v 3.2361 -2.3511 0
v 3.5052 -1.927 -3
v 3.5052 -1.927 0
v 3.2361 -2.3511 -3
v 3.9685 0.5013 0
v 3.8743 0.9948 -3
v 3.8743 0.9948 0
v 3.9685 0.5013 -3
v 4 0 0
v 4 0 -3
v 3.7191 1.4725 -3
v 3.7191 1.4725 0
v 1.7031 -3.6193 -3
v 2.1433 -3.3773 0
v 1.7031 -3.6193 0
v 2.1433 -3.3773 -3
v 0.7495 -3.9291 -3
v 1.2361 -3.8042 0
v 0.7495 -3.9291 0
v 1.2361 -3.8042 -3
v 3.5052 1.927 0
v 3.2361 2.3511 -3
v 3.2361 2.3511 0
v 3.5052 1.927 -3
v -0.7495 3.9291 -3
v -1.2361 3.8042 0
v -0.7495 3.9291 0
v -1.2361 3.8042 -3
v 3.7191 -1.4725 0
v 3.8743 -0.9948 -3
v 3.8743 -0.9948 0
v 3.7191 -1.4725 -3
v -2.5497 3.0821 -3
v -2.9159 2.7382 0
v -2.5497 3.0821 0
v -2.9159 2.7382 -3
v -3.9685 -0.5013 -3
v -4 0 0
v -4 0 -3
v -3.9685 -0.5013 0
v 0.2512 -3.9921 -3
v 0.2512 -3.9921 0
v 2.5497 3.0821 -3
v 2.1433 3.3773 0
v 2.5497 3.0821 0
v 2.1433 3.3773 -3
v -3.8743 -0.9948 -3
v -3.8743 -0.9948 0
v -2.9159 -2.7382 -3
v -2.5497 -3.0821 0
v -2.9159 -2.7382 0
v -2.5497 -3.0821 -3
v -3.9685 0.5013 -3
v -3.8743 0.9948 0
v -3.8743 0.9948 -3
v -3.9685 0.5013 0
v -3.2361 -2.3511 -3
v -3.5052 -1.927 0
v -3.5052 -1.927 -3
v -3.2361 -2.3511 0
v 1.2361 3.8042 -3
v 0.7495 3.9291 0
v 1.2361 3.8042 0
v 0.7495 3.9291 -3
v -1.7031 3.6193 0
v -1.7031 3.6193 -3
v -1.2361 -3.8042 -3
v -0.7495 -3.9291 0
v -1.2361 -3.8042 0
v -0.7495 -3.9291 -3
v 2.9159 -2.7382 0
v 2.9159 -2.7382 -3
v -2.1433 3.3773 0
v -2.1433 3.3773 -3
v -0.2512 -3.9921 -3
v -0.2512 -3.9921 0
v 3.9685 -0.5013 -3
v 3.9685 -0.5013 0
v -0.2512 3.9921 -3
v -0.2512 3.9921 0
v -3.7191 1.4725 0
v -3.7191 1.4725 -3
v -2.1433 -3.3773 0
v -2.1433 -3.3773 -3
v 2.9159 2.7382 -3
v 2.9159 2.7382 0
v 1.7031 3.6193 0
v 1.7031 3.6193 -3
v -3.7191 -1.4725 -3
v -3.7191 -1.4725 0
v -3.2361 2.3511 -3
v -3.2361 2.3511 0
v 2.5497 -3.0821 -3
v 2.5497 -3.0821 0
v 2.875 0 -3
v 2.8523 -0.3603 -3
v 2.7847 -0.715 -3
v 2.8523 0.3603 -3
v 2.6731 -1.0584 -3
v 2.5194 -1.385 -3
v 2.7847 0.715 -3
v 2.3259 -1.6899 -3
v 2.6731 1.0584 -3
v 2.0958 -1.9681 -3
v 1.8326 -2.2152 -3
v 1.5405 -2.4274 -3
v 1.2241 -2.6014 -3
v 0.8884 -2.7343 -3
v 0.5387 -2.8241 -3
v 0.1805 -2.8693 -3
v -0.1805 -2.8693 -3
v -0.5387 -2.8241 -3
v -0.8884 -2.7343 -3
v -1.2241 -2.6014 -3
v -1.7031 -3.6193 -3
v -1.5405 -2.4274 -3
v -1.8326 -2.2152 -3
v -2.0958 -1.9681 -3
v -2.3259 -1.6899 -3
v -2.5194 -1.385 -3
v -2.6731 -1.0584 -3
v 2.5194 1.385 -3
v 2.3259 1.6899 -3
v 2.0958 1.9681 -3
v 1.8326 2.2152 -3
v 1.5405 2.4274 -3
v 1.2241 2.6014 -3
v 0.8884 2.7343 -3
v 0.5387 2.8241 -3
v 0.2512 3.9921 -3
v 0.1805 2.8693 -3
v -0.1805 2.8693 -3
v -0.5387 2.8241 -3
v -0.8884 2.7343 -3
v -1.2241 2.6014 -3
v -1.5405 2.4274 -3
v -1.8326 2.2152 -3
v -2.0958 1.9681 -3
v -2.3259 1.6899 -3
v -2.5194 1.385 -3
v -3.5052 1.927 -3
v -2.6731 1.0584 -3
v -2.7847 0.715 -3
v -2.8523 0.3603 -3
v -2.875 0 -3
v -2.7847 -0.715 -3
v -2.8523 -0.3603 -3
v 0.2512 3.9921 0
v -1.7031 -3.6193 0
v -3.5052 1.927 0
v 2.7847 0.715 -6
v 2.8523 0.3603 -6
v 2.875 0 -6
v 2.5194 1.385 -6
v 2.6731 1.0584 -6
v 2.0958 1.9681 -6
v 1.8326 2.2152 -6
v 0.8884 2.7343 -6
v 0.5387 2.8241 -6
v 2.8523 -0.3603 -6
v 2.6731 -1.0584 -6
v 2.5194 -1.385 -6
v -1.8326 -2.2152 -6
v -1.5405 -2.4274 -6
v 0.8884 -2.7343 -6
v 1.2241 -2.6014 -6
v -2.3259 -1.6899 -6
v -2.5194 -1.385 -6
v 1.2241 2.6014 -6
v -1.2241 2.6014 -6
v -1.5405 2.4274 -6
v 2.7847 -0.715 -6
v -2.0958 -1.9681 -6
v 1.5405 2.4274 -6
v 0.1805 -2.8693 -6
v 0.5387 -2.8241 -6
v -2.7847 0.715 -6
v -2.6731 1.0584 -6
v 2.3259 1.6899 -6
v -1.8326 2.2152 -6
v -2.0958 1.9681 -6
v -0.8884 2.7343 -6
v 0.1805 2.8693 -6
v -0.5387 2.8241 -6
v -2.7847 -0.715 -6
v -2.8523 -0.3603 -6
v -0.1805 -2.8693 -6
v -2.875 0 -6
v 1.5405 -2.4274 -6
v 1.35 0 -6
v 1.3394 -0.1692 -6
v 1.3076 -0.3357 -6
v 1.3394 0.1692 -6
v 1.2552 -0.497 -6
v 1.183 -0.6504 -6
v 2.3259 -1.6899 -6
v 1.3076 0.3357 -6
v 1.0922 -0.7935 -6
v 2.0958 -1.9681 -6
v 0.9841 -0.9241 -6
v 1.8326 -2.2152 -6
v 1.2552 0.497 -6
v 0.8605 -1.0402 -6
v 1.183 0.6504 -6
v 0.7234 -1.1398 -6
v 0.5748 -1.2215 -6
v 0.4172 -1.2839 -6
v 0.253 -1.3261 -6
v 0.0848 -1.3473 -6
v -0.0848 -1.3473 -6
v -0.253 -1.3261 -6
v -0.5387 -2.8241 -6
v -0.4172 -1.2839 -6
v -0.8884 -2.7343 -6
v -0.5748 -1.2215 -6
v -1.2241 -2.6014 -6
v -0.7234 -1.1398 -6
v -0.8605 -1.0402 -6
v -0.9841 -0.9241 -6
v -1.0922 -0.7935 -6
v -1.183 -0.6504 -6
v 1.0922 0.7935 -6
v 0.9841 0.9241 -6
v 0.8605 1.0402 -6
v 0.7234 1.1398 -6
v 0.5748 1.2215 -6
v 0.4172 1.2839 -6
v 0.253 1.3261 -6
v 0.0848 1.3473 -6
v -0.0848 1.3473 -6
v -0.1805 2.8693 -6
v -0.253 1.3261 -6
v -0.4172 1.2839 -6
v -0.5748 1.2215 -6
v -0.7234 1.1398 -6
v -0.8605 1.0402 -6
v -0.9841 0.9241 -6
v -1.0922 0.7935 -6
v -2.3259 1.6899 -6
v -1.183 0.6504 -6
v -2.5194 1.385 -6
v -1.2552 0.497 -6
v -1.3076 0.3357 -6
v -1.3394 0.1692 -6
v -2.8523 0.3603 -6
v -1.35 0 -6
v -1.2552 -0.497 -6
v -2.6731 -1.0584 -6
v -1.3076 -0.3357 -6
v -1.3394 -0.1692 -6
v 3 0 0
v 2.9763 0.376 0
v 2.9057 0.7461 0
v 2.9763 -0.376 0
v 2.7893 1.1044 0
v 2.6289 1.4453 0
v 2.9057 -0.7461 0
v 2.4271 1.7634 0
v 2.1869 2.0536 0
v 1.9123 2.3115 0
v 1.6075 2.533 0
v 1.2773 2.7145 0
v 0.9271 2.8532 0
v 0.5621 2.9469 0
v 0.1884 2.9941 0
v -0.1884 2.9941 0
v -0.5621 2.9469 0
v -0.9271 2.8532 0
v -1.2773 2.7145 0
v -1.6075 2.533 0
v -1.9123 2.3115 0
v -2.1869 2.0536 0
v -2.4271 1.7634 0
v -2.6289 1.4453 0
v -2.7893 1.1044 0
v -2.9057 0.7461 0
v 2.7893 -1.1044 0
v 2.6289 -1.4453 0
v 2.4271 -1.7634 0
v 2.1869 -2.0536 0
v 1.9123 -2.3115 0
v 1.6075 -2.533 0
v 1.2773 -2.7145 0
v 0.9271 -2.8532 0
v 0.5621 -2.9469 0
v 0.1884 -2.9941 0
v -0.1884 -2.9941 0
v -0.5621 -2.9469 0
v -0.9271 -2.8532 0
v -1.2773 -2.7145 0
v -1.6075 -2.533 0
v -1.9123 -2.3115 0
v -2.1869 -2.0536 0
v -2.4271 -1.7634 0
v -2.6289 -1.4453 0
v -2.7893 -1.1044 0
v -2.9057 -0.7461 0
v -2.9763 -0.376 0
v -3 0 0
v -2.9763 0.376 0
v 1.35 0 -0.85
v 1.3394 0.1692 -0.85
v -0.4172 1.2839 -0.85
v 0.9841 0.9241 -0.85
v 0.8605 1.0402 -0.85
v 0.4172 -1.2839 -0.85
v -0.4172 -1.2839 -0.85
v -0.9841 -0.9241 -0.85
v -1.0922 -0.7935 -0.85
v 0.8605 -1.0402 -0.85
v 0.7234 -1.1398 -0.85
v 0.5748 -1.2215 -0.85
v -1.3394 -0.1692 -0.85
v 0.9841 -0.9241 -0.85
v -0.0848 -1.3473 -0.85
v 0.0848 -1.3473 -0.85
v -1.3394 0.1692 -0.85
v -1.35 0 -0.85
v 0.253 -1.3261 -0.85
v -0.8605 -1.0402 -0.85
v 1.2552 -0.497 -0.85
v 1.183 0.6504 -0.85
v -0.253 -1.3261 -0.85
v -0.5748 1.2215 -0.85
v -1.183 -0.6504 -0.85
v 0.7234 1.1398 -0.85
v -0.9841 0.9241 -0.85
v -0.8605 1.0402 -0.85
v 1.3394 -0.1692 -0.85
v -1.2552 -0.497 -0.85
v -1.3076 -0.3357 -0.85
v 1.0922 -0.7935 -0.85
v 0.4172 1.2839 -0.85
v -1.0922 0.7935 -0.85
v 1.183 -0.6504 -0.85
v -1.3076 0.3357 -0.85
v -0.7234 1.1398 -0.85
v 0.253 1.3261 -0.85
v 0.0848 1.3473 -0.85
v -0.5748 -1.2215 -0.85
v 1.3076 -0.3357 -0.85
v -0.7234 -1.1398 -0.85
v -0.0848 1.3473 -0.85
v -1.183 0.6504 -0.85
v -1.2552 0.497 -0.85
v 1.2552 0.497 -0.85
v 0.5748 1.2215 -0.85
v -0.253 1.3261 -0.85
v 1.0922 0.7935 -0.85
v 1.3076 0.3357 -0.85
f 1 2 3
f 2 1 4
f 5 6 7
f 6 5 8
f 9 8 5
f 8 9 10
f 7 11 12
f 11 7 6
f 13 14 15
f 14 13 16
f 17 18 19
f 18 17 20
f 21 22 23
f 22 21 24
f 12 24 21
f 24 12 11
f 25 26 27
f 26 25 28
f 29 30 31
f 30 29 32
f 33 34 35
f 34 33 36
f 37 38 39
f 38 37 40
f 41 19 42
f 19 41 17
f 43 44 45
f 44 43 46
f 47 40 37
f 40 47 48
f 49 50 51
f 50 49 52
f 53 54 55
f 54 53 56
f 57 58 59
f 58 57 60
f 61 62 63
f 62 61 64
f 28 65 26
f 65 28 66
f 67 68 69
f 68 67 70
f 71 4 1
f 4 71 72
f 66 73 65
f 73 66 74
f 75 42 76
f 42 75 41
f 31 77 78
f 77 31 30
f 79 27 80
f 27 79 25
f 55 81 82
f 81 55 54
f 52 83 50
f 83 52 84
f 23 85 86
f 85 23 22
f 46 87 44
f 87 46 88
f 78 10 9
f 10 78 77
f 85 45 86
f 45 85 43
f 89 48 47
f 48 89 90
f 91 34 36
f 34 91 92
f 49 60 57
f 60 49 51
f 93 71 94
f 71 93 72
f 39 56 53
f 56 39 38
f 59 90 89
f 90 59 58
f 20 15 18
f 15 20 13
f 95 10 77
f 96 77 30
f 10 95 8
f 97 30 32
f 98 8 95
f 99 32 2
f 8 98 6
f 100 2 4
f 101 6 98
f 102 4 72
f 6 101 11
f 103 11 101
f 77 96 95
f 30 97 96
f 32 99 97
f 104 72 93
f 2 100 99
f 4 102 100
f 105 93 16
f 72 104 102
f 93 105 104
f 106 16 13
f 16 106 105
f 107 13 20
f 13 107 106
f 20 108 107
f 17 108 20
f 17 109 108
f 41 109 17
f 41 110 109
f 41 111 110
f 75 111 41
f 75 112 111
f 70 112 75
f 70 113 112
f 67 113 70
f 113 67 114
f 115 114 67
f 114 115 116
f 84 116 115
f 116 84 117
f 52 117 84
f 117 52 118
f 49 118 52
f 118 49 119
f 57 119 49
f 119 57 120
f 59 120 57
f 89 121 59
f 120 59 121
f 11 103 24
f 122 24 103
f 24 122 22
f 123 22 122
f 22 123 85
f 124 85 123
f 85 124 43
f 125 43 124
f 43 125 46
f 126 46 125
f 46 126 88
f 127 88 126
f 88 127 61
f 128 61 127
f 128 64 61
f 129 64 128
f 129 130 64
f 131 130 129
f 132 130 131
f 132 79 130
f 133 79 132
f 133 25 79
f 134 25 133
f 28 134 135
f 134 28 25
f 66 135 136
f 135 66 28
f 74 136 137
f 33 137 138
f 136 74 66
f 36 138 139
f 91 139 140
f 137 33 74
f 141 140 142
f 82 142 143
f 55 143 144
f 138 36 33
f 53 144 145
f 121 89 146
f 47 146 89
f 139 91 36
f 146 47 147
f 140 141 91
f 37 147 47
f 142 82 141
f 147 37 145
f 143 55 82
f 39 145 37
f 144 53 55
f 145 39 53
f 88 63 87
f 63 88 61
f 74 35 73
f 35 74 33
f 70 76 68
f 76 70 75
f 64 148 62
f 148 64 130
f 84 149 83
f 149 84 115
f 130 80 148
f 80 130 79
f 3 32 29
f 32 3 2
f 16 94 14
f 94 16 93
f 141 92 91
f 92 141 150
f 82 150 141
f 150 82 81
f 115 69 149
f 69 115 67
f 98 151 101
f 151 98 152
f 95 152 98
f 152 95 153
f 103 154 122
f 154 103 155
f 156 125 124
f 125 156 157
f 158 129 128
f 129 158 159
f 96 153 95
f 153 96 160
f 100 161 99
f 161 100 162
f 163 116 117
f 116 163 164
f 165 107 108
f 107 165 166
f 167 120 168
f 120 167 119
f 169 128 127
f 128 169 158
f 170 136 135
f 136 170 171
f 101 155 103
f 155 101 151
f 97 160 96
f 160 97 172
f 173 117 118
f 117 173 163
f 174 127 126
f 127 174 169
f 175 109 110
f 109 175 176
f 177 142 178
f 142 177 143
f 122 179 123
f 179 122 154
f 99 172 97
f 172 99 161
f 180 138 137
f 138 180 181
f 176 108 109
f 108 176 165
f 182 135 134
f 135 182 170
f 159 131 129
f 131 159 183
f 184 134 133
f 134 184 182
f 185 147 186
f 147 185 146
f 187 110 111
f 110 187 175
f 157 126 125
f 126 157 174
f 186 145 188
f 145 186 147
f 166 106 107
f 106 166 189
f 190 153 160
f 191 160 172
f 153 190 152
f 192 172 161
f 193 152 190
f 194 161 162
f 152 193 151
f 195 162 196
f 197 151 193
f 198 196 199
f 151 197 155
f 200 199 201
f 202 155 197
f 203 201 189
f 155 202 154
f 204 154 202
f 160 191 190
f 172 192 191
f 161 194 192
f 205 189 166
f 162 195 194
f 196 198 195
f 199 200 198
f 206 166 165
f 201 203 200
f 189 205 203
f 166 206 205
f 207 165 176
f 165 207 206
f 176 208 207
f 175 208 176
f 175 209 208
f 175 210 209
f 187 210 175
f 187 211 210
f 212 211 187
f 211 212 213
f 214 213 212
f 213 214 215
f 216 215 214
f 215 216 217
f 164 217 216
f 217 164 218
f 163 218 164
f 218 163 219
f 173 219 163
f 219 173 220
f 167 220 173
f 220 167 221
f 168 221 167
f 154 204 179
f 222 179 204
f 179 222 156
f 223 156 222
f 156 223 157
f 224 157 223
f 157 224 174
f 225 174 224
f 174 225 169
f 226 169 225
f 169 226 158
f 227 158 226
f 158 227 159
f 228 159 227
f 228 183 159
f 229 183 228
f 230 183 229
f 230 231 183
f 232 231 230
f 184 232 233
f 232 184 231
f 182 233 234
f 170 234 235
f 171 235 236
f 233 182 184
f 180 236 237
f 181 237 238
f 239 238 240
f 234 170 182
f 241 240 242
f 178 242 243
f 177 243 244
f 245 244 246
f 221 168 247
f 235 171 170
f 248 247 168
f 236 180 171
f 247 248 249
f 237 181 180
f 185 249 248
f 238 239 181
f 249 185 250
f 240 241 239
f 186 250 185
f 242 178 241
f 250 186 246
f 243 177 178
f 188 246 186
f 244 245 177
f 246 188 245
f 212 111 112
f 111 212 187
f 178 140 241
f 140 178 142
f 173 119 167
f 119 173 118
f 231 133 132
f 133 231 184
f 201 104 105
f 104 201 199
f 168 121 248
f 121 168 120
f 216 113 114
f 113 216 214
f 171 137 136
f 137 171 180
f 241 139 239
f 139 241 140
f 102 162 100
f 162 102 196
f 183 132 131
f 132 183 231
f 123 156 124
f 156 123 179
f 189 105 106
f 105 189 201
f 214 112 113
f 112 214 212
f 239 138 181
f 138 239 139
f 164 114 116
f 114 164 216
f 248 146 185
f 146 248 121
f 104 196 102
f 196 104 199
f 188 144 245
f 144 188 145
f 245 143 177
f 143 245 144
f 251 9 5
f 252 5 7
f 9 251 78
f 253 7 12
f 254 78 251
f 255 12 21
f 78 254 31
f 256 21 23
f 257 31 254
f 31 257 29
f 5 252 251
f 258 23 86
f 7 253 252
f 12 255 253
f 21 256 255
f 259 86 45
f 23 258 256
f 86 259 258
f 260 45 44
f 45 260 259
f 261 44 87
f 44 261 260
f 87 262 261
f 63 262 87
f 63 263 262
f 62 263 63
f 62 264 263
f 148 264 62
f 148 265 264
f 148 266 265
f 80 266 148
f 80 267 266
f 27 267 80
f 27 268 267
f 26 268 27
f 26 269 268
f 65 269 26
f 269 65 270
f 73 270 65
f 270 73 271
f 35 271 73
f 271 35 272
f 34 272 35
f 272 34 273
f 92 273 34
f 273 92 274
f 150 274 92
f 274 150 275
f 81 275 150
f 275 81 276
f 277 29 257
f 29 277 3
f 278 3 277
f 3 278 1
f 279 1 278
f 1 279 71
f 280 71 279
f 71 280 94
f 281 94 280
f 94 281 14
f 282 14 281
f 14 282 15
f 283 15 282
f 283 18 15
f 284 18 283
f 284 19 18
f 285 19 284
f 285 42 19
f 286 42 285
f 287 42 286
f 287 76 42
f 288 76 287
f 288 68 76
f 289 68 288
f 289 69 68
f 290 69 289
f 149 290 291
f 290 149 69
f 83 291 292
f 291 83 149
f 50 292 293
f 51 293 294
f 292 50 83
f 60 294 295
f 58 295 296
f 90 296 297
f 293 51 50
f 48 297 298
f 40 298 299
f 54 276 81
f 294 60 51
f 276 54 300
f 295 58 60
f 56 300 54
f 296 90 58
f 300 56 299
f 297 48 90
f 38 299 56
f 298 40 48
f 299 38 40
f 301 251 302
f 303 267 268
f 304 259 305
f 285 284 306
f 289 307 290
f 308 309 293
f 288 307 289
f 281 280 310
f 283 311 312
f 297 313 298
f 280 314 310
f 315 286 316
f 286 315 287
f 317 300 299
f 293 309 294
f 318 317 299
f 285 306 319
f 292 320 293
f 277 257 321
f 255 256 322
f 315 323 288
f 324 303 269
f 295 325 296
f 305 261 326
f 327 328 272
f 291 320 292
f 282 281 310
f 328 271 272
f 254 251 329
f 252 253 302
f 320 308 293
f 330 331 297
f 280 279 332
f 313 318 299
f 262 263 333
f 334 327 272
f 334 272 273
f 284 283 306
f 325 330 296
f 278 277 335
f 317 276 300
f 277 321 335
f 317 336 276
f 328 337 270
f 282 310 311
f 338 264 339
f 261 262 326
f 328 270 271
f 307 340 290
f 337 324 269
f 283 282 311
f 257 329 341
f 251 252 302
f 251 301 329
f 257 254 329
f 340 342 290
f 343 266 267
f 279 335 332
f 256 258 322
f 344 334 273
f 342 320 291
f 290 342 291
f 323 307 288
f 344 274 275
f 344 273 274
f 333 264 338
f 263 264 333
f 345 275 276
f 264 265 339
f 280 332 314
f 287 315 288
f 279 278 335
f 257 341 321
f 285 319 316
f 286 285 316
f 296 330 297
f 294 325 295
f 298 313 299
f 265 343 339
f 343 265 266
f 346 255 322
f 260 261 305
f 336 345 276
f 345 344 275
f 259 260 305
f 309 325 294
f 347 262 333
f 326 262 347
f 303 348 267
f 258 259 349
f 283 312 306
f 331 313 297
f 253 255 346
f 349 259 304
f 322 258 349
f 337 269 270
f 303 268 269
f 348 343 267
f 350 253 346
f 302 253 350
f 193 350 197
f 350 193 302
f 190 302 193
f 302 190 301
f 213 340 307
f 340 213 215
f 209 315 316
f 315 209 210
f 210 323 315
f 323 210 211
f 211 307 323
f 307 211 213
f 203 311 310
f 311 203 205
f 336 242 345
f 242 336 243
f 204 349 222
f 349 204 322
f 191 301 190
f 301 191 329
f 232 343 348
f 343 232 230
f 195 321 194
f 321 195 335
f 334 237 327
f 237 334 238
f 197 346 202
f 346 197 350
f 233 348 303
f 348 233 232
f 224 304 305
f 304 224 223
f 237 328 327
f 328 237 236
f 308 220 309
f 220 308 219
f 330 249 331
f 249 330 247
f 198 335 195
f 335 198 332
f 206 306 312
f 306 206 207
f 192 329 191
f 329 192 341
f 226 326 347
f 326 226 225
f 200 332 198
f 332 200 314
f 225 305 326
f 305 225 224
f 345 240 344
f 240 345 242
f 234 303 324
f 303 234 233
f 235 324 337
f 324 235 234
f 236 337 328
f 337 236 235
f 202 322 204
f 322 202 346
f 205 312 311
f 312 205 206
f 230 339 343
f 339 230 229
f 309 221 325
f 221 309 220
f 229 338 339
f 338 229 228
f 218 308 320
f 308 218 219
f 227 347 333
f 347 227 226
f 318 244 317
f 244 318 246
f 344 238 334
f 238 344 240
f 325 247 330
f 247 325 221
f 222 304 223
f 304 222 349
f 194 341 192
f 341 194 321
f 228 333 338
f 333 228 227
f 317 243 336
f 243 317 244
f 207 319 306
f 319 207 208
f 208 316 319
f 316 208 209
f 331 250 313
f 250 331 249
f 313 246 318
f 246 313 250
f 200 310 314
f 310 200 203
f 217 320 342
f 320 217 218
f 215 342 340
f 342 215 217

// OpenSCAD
$fn = 50;

difference() {
	union() {
		translate(v = [0, 0, -3.0]) {
			cylinder(h = 6, r = 4.0);
		}
		#translate(v = [0, 0, -6.0]) {
			cylinder(h = 6, r = 2.875);
		}
	}
	union() {
		translate(v = [0, 0, 0]) {
			rotate(a = [0, 0, 0]) {
				difference() {
					union() {
						translate(v = [0, 0, -6.0]) {
							cylinder(h = 6, r = 1.0);
						}
						translate(v = [0, 0, -0.85]) {
							cylinder(h = 0.85, r1 = 1.35, r2 = 3.0);
						}
						translate(v = [0, 0, -6.0]) {
							cylinder(h = 6, r = 1.35);
						}
						translate(v = [0, 0, -6.0]) {
							cylinder(h = 6, r = 1.0);
						}
					}
					union();
				}
			}
		}
		#cylinder(h = 3, r = 5.0);
	}
}
